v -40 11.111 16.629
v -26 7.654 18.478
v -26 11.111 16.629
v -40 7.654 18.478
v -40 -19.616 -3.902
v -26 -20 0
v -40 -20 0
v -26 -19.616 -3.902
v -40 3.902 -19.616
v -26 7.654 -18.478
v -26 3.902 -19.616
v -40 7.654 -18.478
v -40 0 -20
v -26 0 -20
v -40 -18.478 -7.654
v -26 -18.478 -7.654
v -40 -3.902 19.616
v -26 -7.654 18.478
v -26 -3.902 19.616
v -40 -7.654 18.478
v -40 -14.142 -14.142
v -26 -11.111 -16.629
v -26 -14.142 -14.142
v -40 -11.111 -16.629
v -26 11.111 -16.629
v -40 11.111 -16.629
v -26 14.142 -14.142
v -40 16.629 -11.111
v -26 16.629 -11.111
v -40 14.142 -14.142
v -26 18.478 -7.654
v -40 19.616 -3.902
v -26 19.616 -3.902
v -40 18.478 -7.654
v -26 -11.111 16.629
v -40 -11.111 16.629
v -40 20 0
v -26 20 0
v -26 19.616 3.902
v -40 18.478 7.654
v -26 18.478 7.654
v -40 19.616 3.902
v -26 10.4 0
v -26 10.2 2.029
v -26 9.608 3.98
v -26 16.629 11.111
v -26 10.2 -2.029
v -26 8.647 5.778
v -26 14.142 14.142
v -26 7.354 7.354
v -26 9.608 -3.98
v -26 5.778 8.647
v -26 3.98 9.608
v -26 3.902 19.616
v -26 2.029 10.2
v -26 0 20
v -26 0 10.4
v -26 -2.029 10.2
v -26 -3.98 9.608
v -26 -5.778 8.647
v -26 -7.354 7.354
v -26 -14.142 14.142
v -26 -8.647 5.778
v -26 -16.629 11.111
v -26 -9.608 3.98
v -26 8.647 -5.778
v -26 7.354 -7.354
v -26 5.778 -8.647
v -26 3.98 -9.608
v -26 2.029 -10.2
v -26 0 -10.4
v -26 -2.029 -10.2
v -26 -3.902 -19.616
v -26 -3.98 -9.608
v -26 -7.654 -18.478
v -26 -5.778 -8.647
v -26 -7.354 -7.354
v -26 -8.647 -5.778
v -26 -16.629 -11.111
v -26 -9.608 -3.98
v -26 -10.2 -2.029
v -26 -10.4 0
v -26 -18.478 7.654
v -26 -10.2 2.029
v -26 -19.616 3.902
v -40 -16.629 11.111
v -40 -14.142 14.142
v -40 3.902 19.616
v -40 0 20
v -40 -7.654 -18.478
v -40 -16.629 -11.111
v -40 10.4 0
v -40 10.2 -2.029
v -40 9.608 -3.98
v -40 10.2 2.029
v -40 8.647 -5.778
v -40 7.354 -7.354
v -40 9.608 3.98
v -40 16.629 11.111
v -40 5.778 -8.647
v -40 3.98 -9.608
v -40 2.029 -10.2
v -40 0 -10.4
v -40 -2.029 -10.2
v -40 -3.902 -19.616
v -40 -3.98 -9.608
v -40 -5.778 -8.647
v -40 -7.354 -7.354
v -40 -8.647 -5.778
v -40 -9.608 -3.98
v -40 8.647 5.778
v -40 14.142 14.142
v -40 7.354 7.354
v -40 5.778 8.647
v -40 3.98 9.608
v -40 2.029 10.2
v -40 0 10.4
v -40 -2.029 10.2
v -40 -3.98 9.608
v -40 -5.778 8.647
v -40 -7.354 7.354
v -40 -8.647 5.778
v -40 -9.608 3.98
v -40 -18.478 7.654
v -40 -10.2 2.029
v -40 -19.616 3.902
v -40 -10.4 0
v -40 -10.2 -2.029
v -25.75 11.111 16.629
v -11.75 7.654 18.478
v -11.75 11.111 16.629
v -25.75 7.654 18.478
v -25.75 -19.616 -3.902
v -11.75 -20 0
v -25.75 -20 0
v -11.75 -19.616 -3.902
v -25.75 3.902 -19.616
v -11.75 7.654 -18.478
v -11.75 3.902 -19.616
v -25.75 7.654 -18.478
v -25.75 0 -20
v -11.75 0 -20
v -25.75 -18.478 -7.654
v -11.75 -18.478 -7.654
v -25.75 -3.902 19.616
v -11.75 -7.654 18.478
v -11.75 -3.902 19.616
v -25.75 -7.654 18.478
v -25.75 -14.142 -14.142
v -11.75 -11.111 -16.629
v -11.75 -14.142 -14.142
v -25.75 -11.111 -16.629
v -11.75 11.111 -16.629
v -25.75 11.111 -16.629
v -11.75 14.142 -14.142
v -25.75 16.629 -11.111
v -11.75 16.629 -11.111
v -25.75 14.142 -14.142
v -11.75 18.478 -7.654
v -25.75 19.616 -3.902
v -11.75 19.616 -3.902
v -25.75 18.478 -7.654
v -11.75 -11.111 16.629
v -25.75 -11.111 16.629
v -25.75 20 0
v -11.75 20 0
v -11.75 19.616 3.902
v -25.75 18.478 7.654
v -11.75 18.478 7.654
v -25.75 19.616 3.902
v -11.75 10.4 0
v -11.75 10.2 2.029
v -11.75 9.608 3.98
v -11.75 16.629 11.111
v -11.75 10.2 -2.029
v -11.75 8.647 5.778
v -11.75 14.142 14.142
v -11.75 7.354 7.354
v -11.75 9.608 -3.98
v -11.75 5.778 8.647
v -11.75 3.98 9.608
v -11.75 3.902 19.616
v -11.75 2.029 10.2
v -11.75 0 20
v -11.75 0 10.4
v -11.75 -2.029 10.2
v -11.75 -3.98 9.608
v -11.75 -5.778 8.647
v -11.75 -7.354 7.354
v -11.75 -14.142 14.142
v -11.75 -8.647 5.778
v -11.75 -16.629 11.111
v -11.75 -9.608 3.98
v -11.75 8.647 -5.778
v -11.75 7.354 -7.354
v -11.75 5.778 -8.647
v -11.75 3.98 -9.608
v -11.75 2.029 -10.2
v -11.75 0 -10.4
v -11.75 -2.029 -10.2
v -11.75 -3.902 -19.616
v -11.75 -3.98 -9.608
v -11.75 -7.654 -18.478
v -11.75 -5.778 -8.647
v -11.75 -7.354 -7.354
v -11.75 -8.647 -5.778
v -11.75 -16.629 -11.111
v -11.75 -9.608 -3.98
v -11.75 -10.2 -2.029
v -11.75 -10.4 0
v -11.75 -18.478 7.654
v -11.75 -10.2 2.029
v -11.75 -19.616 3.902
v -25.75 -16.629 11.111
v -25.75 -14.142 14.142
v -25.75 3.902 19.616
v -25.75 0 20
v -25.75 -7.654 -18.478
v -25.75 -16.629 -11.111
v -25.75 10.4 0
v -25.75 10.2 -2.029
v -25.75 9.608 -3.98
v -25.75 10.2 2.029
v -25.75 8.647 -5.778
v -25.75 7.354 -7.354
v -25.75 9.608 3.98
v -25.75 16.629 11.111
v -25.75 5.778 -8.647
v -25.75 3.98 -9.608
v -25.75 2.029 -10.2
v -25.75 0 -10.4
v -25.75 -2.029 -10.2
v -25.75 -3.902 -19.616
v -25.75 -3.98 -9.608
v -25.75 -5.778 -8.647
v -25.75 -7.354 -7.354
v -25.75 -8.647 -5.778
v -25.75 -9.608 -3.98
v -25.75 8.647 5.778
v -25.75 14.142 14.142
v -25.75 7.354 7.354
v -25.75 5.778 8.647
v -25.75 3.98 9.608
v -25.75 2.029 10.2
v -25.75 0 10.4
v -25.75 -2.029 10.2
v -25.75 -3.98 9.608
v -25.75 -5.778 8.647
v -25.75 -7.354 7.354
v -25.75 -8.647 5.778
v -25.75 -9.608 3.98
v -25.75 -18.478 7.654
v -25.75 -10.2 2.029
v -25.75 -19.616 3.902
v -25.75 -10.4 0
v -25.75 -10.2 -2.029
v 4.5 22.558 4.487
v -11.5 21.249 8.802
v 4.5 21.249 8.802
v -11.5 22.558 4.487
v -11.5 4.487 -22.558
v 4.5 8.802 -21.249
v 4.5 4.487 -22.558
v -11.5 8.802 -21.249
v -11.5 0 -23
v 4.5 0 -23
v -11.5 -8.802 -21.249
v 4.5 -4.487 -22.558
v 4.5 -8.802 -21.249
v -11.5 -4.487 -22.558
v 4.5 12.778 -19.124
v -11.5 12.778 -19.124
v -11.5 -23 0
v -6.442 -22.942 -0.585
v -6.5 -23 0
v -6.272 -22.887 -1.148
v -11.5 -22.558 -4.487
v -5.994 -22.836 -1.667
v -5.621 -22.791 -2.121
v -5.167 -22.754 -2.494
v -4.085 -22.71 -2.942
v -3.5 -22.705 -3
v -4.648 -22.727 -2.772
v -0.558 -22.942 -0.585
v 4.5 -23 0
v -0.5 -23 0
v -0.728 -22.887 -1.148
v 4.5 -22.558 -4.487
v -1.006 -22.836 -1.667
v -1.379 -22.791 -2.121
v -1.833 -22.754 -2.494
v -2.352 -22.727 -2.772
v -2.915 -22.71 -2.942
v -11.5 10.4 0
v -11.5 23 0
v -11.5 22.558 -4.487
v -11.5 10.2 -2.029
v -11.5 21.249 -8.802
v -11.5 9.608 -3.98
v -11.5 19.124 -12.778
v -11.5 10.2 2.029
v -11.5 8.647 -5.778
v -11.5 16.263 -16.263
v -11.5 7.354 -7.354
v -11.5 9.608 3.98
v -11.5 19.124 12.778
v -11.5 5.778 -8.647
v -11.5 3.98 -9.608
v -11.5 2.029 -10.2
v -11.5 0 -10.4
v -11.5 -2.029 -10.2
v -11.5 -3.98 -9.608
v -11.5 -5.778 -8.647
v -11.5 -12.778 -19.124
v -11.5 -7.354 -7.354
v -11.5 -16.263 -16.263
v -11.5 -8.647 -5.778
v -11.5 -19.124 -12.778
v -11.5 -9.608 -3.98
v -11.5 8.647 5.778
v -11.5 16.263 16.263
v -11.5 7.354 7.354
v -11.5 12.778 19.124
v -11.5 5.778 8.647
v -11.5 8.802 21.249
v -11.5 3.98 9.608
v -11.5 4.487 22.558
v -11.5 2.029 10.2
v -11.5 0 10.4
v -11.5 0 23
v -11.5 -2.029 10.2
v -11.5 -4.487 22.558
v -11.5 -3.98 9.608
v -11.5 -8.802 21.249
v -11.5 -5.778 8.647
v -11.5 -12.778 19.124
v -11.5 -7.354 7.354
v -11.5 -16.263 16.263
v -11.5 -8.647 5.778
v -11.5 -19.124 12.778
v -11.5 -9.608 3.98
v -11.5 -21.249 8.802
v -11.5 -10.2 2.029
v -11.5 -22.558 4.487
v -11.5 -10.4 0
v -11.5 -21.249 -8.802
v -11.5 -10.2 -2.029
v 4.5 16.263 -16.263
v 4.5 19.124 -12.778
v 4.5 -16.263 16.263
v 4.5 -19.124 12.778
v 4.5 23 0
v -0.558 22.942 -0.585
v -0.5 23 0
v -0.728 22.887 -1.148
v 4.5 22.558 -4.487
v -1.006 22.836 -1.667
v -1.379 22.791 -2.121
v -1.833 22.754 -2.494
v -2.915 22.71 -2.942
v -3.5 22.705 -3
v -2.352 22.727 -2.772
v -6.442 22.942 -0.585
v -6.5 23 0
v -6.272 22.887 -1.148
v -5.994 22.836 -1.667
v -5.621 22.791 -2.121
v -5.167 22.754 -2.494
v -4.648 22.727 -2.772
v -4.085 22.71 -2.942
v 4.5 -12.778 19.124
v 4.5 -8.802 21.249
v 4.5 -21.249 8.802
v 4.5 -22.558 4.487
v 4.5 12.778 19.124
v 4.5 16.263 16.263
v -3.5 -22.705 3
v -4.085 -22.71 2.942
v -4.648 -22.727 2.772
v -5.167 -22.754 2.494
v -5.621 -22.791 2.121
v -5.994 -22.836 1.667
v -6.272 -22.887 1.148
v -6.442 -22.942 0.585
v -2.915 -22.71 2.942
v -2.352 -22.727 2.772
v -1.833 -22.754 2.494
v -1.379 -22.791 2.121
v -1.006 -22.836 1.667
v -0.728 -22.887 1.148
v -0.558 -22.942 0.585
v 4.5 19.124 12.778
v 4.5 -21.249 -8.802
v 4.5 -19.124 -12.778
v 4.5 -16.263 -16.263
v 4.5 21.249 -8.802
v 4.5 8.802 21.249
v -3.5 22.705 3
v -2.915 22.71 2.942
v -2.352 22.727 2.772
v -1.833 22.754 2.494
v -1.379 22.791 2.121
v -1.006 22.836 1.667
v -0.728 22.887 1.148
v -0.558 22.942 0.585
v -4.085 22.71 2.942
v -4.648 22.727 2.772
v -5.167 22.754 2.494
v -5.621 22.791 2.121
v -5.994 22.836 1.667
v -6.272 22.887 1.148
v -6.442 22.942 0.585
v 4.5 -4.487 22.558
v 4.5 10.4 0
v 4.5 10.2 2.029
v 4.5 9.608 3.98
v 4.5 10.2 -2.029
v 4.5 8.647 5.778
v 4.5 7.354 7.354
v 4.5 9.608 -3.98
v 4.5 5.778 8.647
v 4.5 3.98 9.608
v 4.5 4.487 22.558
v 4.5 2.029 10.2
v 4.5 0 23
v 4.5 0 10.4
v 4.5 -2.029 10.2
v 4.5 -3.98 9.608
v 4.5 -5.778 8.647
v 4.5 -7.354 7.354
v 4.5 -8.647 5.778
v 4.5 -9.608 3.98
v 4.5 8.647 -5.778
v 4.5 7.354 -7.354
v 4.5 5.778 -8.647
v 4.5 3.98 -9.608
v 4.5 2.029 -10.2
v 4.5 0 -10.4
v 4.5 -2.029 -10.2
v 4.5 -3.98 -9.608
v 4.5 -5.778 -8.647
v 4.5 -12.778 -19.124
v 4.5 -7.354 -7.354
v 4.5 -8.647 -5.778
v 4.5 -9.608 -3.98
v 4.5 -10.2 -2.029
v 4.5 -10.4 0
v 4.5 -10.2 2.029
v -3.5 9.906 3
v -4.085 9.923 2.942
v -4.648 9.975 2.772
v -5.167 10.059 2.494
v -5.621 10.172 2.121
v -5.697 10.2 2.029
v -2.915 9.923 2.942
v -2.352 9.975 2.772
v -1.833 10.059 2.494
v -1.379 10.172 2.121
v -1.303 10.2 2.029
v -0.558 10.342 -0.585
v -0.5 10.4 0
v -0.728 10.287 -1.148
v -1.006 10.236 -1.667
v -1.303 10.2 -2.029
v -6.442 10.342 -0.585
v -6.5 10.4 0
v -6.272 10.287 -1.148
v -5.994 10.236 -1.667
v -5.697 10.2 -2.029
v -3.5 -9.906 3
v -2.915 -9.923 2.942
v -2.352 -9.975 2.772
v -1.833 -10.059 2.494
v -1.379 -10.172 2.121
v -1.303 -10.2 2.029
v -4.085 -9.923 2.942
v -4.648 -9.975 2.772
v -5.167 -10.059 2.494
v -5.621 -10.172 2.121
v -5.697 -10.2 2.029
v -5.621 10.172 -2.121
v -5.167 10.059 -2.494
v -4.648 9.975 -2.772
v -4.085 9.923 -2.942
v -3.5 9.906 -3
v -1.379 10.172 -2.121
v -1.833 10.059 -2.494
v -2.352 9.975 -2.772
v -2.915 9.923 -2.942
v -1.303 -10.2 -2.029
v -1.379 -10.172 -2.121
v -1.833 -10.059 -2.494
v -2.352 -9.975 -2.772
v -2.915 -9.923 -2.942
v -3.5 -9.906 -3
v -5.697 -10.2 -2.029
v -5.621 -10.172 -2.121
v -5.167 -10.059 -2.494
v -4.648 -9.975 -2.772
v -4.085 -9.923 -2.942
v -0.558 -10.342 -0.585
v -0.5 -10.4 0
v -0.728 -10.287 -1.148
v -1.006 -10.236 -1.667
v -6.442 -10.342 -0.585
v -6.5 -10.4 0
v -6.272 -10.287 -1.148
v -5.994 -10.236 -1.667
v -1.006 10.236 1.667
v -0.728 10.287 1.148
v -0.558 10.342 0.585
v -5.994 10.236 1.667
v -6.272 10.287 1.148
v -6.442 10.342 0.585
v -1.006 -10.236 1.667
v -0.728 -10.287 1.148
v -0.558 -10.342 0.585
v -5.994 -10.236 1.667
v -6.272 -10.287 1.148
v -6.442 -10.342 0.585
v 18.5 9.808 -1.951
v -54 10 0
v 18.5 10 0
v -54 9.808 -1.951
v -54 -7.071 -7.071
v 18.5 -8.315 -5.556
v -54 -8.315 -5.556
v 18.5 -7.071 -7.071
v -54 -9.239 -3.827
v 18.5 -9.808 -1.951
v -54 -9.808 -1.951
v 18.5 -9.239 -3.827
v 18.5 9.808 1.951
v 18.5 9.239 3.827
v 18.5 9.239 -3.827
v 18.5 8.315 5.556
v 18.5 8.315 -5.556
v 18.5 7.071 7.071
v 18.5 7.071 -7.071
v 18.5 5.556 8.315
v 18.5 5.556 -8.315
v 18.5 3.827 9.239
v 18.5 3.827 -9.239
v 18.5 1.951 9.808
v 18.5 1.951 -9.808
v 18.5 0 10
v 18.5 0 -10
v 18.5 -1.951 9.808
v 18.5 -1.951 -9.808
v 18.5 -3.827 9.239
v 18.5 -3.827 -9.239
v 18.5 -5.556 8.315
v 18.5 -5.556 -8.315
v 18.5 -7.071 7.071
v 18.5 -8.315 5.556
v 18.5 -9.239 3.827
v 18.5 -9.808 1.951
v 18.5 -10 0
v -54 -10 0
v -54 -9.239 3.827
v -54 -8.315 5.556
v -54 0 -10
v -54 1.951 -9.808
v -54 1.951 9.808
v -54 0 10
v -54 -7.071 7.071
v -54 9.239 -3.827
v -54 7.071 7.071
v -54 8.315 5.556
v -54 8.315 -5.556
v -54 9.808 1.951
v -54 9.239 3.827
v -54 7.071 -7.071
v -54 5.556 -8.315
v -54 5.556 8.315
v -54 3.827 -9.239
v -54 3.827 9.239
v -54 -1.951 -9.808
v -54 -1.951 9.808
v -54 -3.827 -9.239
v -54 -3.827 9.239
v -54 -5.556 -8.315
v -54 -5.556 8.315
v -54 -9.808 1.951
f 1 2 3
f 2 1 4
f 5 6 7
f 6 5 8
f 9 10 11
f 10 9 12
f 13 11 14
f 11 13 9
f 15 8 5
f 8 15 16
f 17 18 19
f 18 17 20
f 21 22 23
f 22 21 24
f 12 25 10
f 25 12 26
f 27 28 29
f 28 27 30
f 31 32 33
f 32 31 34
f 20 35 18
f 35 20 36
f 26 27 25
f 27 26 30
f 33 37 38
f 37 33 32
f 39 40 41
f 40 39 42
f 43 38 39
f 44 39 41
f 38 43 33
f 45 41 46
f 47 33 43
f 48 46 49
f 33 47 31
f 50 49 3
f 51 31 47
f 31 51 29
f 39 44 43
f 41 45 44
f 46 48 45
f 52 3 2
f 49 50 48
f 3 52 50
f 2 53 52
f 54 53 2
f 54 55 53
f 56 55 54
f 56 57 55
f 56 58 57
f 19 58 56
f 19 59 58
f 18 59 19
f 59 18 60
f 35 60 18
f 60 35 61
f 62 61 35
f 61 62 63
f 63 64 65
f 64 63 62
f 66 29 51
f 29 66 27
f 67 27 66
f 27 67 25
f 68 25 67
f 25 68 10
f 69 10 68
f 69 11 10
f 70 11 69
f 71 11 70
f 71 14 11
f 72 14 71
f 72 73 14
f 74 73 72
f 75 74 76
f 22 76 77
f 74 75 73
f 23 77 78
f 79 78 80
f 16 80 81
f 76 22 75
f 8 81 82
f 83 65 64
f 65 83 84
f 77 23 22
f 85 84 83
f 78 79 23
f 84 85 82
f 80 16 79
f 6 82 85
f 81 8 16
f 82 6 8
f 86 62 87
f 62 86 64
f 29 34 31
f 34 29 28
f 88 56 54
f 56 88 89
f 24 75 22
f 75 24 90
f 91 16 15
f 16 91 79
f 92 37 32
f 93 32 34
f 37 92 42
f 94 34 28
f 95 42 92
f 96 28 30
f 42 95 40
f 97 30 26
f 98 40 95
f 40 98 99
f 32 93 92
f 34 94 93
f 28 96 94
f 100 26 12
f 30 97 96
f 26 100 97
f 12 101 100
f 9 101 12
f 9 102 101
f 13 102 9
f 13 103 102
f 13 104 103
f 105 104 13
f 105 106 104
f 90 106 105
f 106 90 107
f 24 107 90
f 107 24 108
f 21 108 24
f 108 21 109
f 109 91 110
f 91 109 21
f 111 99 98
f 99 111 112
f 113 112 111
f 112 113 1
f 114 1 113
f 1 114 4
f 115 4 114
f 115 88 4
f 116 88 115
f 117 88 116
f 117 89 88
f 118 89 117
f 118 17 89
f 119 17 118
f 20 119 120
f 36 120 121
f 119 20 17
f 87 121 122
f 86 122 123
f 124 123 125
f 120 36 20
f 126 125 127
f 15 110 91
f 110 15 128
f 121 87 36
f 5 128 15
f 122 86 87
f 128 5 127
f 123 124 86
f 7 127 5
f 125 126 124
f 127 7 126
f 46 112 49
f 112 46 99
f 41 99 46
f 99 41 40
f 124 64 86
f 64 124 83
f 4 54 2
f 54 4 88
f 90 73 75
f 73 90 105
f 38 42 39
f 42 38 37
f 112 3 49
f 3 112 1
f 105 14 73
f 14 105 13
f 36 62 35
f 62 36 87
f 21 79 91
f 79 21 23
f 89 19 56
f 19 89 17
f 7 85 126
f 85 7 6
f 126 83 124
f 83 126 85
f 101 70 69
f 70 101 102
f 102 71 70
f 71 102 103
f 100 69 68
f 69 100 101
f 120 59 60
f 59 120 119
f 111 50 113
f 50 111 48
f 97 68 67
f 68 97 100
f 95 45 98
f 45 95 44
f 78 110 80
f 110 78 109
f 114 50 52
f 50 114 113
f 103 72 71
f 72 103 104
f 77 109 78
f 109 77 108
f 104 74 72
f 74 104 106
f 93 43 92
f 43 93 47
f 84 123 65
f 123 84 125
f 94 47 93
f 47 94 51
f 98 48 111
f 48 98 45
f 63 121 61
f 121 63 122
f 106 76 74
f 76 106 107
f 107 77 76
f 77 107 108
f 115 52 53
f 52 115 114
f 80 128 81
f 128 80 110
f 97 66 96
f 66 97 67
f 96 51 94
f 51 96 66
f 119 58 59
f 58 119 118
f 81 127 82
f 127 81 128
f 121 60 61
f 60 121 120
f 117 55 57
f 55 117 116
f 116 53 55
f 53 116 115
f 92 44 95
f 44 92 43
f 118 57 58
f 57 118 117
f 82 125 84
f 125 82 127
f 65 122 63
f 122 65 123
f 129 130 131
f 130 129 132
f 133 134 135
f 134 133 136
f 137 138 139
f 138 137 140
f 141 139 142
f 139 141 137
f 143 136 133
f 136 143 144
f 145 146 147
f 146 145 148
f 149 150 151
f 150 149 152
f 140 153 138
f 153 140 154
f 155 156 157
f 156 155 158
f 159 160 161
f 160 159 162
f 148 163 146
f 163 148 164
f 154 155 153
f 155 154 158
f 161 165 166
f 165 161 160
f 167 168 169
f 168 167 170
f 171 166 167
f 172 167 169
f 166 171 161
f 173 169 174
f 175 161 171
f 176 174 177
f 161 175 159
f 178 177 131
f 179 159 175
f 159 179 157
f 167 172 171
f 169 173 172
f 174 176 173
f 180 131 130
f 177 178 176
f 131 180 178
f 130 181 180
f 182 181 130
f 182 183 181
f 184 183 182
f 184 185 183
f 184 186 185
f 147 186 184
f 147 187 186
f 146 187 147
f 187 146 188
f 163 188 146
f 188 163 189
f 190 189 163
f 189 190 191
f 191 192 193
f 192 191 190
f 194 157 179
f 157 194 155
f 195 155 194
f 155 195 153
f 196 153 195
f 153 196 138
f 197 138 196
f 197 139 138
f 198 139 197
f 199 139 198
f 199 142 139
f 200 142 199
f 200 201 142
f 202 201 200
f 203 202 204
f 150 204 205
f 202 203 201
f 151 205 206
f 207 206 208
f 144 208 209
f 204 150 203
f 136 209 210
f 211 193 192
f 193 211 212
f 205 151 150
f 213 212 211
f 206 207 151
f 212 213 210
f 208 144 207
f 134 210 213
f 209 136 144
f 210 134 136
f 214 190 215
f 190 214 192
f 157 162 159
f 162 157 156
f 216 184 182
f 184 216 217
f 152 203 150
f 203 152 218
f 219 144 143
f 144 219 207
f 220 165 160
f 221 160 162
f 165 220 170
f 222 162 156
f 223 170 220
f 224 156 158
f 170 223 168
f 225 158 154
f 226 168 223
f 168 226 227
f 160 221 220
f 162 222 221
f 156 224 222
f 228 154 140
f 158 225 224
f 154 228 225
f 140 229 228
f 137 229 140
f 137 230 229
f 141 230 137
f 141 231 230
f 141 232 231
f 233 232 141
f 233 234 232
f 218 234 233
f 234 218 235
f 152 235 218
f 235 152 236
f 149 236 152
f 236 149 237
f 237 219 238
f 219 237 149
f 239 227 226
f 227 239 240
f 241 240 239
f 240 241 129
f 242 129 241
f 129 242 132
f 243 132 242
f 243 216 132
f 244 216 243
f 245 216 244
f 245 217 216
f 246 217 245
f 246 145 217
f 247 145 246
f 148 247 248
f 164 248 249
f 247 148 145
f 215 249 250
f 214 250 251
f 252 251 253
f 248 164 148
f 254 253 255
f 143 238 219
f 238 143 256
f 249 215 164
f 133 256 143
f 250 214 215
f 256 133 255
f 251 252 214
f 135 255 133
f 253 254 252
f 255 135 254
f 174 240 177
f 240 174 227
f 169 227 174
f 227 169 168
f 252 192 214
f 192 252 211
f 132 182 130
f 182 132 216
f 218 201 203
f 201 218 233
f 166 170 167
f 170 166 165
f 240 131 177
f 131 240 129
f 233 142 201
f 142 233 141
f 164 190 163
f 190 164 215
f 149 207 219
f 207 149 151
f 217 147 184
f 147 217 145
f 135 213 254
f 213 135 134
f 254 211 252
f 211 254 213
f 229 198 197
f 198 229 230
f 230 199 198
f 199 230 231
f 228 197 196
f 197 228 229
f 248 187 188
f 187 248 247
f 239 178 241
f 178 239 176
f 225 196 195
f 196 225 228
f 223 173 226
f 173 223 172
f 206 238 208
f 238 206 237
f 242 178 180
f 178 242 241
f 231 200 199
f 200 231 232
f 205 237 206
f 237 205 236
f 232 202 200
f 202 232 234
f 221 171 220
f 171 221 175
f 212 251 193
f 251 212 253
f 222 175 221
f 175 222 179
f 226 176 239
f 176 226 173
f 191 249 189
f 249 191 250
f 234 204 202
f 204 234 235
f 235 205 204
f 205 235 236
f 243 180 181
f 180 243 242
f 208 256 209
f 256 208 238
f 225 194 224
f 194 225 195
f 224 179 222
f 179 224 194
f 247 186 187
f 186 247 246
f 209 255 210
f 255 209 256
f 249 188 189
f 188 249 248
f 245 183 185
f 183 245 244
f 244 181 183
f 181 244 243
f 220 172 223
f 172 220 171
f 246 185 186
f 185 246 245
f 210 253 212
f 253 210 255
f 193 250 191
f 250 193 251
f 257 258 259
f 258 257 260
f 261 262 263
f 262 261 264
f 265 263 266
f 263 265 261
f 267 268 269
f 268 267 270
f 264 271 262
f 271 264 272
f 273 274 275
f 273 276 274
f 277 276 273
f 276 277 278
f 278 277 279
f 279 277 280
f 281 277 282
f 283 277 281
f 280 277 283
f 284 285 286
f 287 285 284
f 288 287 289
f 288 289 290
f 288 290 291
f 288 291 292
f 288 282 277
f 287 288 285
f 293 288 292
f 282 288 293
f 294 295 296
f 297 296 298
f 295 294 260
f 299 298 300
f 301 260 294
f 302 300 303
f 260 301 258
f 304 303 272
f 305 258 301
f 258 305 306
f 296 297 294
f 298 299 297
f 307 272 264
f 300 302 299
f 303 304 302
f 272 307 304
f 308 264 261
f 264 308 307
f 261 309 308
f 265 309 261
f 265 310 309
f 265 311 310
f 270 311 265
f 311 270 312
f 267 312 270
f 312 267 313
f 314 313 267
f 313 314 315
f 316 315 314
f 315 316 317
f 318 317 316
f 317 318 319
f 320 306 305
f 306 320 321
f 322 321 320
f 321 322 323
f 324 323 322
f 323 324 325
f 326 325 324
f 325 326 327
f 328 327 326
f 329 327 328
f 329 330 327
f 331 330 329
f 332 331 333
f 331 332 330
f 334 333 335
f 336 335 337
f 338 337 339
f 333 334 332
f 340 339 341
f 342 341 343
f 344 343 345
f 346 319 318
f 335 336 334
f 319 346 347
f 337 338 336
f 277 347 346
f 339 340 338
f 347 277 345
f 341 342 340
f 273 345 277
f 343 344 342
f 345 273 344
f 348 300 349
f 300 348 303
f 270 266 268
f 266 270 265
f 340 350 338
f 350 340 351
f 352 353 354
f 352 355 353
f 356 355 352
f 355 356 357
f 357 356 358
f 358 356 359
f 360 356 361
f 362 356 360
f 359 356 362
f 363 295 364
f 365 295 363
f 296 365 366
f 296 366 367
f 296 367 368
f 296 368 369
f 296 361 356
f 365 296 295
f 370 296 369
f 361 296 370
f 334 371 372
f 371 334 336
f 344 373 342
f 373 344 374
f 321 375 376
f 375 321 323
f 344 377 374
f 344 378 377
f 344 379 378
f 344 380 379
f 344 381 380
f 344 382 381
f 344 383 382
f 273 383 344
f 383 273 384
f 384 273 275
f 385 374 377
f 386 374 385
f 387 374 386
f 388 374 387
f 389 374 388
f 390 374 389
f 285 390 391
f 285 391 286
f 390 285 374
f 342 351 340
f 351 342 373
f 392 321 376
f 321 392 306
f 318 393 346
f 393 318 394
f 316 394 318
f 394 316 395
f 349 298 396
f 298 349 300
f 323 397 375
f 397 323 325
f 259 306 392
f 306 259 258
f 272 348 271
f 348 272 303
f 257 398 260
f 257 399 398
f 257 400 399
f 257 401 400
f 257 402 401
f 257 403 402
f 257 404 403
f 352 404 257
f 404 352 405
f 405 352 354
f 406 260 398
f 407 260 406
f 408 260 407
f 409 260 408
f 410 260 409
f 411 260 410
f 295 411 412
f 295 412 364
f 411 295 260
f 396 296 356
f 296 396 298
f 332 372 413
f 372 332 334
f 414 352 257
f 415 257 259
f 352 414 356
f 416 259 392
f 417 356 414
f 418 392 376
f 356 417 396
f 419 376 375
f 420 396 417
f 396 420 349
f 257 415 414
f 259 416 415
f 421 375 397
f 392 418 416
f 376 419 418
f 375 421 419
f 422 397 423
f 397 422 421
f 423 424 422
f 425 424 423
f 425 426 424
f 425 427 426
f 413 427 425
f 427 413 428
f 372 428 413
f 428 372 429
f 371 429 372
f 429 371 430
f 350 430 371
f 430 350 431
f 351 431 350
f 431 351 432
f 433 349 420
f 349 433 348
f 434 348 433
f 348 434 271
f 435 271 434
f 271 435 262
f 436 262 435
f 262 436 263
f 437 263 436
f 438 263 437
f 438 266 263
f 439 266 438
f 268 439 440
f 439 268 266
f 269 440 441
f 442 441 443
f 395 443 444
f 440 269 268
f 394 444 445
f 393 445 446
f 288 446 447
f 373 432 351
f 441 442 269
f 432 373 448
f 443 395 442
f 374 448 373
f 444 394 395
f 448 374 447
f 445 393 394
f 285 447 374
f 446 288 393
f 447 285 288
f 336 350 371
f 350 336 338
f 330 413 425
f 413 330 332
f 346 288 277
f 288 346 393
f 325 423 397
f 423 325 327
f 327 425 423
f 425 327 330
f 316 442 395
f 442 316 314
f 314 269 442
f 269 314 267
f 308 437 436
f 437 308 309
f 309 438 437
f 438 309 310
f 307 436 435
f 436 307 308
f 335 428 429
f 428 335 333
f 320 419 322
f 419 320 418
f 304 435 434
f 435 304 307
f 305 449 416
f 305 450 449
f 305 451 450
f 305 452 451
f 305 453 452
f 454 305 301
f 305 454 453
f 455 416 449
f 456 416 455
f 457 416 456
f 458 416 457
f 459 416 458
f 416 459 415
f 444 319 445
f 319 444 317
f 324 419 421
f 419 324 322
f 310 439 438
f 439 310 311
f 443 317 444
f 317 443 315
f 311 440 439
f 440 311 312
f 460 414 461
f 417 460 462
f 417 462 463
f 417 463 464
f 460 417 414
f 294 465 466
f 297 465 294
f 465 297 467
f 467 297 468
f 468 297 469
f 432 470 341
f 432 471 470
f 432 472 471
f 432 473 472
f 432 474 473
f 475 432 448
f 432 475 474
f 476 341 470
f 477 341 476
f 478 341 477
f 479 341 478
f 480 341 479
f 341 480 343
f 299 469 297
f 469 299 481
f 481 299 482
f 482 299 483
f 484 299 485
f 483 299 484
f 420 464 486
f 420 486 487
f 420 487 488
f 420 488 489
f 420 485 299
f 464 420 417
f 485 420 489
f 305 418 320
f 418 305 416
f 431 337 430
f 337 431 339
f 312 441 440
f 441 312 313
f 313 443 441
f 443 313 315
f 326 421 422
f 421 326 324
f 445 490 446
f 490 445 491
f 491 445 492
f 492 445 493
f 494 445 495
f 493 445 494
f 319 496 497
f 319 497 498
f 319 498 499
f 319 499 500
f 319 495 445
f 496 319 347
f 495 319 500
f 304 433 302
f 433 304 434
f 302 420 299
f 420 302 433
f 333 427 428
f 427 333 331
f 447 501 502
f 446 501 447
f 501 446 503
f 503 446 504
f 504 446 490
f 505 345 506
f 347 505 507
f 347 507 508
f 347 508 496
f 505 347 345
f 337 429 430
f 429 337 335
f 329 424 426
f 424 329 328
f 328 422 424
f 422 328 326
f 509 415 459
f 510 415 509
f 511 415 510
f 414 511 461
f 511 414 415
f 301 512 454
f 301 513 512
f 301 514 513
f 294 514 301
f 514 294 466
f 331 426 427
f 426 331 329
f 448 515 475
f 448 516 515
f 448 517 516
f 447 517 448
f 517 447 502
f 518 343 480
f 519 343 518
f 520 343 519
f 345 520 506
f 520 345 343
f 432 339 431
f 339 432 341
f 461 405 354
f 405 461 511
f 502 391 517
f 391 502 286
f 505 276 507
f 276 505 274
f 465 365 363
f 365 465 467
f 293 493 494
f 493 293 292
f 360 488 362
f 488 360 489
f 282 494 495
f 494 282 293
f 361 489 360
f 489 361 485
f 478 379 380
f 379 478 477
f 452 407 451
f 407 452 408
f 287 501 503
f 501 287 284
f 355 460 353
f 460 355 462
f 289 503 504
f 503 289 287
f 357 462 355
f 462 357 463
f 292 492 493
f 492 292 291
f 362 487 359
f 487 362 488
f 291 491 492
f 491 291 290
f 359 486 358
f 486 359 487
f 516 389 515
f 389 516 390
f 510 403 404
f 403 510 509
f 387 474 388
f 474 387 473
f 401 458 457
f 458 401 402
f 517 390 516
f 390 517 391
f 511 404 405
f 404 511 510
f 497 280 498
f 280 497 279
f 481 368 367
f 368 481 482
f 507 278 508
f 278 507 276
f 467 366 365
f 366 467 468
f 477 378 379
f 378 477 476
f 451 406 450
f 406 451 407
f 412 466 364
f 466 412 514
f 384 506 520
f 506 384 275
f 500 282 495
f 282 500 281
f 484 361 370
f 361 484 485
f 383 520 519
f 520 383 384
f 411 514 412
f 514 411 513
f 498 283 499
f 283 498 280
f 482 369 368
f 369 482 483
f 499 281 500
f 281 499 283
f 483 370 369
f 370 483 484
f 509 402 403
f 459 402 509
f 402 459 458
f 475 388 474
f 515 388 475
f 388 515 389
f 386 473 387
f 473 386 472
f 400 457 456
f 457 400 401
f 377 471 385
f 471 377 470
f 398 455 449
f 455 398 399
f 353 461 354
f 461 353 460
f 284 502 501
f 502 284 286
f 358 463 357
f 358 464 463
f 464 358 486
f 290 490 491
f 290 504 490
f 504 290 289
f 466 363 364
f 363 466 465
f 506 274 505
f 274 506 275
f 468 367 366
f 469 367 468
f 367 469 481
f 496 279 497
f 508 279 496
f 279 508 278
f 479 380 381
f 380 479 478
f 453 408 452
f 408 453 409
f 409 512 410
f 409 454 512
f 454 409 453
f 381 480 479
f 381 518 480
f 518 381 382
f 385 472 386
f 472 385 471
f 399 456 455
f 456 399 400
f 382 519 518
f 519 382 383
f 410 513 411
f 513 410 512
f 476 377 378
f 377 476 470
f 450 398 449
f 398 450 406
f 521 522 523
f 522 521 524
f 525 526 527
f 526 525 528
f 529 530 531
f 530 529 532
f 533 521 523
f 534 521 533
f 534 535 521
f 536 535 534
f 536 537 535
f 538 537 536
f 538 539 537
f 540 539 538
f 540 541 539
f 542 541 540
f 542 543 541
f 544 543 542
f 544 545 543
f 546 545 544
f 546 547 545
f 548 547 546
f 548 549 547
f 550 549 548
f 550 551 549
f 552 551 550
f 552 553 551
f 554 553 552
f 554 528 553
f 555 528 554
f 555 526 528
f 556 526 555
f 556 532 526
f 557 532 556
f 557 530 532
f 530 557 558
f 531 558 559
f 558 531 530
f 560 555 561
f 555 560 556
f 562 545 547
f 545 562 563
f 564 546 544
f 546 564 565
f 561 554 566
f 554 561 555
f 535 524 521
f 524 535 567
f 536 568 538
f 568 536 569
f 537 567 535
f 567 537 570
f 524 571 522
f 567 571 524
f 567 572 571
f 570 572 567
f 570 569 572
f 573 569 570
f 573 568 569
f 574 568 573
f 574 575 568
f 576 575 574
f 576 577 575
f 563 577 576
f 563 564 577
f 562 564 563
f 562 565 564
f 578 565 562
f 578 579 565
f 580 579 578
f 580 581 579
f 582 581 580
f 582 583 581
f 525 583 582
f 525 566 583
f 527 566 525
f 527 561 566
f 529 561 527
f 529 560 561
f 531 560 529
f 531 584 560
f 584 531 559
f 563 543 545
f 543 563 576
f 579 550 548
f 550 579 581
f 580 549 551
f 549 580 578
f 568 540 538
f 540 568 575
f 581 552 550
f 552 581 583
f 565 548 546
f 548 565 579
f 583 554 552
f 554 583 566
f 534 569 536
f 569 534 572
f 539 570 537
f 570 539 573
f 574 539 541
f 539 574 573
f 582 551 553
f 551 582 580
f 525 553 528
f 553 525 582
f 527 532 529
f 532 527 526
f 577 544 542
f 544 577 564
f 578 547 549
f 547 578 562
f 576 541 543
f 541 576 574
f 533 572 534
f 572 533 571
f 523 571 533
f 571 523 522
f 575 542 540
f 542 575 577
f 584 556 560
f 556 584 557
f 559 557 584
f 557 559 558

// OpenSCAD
$fn = 32;

// ------------------------------------------------------------------------
// Shaft with rings and collars: d20 shaft, 3 rings
// Every part is its own module, assembly() places them once.
// ------------------------------------------------------------------------

// --- part 1 ---
module shaft() {
  translate([0, 0, -36.25]) cylinder(h = 72.5, d = 20);
}

// --- part 2 ---
module spacer_a() {
  difference() {
      translate([0, 0, 0]) cylinder(h = 14, d = 40);
      translate([0, 0, -1]) cylinder(h = 16, d = 20.8);
    }
}

// --- part 3 ---
module spacer_b() {
  difference() {
      translate([0, 0, 0]) cylinder(h = 14, d = 40);
      translate([0, 0, -1]) cylinder(h = 16, d = 20.8);
    }
}

// --- part 4 ---
module collar_a() {
  difference() {
    cylinder(h = 16, d = 46);
    translate([0, 0, -1]) cylinder(h = 18, d = 20.8);
    translate([0, 0, 8]) rotate([90, 0, 0]) cylinder(h = 48, d = 6, center = true);
  }
}

// --- assembly ---
module assembly() {
  translate([-17.75, 0, 0]) rotate([0, 90, 0]) shaft();
  translate([-40, 0, 0]) rotate([0, 90, 0]) spacer_a();
  translate([-25.75, 0, 0]) rotate([0, 90, 0]) spacer_b();
  translate([-11.5, 0, 0]) rotate([0, 90, 0]) collar_a();
}

assembly();
